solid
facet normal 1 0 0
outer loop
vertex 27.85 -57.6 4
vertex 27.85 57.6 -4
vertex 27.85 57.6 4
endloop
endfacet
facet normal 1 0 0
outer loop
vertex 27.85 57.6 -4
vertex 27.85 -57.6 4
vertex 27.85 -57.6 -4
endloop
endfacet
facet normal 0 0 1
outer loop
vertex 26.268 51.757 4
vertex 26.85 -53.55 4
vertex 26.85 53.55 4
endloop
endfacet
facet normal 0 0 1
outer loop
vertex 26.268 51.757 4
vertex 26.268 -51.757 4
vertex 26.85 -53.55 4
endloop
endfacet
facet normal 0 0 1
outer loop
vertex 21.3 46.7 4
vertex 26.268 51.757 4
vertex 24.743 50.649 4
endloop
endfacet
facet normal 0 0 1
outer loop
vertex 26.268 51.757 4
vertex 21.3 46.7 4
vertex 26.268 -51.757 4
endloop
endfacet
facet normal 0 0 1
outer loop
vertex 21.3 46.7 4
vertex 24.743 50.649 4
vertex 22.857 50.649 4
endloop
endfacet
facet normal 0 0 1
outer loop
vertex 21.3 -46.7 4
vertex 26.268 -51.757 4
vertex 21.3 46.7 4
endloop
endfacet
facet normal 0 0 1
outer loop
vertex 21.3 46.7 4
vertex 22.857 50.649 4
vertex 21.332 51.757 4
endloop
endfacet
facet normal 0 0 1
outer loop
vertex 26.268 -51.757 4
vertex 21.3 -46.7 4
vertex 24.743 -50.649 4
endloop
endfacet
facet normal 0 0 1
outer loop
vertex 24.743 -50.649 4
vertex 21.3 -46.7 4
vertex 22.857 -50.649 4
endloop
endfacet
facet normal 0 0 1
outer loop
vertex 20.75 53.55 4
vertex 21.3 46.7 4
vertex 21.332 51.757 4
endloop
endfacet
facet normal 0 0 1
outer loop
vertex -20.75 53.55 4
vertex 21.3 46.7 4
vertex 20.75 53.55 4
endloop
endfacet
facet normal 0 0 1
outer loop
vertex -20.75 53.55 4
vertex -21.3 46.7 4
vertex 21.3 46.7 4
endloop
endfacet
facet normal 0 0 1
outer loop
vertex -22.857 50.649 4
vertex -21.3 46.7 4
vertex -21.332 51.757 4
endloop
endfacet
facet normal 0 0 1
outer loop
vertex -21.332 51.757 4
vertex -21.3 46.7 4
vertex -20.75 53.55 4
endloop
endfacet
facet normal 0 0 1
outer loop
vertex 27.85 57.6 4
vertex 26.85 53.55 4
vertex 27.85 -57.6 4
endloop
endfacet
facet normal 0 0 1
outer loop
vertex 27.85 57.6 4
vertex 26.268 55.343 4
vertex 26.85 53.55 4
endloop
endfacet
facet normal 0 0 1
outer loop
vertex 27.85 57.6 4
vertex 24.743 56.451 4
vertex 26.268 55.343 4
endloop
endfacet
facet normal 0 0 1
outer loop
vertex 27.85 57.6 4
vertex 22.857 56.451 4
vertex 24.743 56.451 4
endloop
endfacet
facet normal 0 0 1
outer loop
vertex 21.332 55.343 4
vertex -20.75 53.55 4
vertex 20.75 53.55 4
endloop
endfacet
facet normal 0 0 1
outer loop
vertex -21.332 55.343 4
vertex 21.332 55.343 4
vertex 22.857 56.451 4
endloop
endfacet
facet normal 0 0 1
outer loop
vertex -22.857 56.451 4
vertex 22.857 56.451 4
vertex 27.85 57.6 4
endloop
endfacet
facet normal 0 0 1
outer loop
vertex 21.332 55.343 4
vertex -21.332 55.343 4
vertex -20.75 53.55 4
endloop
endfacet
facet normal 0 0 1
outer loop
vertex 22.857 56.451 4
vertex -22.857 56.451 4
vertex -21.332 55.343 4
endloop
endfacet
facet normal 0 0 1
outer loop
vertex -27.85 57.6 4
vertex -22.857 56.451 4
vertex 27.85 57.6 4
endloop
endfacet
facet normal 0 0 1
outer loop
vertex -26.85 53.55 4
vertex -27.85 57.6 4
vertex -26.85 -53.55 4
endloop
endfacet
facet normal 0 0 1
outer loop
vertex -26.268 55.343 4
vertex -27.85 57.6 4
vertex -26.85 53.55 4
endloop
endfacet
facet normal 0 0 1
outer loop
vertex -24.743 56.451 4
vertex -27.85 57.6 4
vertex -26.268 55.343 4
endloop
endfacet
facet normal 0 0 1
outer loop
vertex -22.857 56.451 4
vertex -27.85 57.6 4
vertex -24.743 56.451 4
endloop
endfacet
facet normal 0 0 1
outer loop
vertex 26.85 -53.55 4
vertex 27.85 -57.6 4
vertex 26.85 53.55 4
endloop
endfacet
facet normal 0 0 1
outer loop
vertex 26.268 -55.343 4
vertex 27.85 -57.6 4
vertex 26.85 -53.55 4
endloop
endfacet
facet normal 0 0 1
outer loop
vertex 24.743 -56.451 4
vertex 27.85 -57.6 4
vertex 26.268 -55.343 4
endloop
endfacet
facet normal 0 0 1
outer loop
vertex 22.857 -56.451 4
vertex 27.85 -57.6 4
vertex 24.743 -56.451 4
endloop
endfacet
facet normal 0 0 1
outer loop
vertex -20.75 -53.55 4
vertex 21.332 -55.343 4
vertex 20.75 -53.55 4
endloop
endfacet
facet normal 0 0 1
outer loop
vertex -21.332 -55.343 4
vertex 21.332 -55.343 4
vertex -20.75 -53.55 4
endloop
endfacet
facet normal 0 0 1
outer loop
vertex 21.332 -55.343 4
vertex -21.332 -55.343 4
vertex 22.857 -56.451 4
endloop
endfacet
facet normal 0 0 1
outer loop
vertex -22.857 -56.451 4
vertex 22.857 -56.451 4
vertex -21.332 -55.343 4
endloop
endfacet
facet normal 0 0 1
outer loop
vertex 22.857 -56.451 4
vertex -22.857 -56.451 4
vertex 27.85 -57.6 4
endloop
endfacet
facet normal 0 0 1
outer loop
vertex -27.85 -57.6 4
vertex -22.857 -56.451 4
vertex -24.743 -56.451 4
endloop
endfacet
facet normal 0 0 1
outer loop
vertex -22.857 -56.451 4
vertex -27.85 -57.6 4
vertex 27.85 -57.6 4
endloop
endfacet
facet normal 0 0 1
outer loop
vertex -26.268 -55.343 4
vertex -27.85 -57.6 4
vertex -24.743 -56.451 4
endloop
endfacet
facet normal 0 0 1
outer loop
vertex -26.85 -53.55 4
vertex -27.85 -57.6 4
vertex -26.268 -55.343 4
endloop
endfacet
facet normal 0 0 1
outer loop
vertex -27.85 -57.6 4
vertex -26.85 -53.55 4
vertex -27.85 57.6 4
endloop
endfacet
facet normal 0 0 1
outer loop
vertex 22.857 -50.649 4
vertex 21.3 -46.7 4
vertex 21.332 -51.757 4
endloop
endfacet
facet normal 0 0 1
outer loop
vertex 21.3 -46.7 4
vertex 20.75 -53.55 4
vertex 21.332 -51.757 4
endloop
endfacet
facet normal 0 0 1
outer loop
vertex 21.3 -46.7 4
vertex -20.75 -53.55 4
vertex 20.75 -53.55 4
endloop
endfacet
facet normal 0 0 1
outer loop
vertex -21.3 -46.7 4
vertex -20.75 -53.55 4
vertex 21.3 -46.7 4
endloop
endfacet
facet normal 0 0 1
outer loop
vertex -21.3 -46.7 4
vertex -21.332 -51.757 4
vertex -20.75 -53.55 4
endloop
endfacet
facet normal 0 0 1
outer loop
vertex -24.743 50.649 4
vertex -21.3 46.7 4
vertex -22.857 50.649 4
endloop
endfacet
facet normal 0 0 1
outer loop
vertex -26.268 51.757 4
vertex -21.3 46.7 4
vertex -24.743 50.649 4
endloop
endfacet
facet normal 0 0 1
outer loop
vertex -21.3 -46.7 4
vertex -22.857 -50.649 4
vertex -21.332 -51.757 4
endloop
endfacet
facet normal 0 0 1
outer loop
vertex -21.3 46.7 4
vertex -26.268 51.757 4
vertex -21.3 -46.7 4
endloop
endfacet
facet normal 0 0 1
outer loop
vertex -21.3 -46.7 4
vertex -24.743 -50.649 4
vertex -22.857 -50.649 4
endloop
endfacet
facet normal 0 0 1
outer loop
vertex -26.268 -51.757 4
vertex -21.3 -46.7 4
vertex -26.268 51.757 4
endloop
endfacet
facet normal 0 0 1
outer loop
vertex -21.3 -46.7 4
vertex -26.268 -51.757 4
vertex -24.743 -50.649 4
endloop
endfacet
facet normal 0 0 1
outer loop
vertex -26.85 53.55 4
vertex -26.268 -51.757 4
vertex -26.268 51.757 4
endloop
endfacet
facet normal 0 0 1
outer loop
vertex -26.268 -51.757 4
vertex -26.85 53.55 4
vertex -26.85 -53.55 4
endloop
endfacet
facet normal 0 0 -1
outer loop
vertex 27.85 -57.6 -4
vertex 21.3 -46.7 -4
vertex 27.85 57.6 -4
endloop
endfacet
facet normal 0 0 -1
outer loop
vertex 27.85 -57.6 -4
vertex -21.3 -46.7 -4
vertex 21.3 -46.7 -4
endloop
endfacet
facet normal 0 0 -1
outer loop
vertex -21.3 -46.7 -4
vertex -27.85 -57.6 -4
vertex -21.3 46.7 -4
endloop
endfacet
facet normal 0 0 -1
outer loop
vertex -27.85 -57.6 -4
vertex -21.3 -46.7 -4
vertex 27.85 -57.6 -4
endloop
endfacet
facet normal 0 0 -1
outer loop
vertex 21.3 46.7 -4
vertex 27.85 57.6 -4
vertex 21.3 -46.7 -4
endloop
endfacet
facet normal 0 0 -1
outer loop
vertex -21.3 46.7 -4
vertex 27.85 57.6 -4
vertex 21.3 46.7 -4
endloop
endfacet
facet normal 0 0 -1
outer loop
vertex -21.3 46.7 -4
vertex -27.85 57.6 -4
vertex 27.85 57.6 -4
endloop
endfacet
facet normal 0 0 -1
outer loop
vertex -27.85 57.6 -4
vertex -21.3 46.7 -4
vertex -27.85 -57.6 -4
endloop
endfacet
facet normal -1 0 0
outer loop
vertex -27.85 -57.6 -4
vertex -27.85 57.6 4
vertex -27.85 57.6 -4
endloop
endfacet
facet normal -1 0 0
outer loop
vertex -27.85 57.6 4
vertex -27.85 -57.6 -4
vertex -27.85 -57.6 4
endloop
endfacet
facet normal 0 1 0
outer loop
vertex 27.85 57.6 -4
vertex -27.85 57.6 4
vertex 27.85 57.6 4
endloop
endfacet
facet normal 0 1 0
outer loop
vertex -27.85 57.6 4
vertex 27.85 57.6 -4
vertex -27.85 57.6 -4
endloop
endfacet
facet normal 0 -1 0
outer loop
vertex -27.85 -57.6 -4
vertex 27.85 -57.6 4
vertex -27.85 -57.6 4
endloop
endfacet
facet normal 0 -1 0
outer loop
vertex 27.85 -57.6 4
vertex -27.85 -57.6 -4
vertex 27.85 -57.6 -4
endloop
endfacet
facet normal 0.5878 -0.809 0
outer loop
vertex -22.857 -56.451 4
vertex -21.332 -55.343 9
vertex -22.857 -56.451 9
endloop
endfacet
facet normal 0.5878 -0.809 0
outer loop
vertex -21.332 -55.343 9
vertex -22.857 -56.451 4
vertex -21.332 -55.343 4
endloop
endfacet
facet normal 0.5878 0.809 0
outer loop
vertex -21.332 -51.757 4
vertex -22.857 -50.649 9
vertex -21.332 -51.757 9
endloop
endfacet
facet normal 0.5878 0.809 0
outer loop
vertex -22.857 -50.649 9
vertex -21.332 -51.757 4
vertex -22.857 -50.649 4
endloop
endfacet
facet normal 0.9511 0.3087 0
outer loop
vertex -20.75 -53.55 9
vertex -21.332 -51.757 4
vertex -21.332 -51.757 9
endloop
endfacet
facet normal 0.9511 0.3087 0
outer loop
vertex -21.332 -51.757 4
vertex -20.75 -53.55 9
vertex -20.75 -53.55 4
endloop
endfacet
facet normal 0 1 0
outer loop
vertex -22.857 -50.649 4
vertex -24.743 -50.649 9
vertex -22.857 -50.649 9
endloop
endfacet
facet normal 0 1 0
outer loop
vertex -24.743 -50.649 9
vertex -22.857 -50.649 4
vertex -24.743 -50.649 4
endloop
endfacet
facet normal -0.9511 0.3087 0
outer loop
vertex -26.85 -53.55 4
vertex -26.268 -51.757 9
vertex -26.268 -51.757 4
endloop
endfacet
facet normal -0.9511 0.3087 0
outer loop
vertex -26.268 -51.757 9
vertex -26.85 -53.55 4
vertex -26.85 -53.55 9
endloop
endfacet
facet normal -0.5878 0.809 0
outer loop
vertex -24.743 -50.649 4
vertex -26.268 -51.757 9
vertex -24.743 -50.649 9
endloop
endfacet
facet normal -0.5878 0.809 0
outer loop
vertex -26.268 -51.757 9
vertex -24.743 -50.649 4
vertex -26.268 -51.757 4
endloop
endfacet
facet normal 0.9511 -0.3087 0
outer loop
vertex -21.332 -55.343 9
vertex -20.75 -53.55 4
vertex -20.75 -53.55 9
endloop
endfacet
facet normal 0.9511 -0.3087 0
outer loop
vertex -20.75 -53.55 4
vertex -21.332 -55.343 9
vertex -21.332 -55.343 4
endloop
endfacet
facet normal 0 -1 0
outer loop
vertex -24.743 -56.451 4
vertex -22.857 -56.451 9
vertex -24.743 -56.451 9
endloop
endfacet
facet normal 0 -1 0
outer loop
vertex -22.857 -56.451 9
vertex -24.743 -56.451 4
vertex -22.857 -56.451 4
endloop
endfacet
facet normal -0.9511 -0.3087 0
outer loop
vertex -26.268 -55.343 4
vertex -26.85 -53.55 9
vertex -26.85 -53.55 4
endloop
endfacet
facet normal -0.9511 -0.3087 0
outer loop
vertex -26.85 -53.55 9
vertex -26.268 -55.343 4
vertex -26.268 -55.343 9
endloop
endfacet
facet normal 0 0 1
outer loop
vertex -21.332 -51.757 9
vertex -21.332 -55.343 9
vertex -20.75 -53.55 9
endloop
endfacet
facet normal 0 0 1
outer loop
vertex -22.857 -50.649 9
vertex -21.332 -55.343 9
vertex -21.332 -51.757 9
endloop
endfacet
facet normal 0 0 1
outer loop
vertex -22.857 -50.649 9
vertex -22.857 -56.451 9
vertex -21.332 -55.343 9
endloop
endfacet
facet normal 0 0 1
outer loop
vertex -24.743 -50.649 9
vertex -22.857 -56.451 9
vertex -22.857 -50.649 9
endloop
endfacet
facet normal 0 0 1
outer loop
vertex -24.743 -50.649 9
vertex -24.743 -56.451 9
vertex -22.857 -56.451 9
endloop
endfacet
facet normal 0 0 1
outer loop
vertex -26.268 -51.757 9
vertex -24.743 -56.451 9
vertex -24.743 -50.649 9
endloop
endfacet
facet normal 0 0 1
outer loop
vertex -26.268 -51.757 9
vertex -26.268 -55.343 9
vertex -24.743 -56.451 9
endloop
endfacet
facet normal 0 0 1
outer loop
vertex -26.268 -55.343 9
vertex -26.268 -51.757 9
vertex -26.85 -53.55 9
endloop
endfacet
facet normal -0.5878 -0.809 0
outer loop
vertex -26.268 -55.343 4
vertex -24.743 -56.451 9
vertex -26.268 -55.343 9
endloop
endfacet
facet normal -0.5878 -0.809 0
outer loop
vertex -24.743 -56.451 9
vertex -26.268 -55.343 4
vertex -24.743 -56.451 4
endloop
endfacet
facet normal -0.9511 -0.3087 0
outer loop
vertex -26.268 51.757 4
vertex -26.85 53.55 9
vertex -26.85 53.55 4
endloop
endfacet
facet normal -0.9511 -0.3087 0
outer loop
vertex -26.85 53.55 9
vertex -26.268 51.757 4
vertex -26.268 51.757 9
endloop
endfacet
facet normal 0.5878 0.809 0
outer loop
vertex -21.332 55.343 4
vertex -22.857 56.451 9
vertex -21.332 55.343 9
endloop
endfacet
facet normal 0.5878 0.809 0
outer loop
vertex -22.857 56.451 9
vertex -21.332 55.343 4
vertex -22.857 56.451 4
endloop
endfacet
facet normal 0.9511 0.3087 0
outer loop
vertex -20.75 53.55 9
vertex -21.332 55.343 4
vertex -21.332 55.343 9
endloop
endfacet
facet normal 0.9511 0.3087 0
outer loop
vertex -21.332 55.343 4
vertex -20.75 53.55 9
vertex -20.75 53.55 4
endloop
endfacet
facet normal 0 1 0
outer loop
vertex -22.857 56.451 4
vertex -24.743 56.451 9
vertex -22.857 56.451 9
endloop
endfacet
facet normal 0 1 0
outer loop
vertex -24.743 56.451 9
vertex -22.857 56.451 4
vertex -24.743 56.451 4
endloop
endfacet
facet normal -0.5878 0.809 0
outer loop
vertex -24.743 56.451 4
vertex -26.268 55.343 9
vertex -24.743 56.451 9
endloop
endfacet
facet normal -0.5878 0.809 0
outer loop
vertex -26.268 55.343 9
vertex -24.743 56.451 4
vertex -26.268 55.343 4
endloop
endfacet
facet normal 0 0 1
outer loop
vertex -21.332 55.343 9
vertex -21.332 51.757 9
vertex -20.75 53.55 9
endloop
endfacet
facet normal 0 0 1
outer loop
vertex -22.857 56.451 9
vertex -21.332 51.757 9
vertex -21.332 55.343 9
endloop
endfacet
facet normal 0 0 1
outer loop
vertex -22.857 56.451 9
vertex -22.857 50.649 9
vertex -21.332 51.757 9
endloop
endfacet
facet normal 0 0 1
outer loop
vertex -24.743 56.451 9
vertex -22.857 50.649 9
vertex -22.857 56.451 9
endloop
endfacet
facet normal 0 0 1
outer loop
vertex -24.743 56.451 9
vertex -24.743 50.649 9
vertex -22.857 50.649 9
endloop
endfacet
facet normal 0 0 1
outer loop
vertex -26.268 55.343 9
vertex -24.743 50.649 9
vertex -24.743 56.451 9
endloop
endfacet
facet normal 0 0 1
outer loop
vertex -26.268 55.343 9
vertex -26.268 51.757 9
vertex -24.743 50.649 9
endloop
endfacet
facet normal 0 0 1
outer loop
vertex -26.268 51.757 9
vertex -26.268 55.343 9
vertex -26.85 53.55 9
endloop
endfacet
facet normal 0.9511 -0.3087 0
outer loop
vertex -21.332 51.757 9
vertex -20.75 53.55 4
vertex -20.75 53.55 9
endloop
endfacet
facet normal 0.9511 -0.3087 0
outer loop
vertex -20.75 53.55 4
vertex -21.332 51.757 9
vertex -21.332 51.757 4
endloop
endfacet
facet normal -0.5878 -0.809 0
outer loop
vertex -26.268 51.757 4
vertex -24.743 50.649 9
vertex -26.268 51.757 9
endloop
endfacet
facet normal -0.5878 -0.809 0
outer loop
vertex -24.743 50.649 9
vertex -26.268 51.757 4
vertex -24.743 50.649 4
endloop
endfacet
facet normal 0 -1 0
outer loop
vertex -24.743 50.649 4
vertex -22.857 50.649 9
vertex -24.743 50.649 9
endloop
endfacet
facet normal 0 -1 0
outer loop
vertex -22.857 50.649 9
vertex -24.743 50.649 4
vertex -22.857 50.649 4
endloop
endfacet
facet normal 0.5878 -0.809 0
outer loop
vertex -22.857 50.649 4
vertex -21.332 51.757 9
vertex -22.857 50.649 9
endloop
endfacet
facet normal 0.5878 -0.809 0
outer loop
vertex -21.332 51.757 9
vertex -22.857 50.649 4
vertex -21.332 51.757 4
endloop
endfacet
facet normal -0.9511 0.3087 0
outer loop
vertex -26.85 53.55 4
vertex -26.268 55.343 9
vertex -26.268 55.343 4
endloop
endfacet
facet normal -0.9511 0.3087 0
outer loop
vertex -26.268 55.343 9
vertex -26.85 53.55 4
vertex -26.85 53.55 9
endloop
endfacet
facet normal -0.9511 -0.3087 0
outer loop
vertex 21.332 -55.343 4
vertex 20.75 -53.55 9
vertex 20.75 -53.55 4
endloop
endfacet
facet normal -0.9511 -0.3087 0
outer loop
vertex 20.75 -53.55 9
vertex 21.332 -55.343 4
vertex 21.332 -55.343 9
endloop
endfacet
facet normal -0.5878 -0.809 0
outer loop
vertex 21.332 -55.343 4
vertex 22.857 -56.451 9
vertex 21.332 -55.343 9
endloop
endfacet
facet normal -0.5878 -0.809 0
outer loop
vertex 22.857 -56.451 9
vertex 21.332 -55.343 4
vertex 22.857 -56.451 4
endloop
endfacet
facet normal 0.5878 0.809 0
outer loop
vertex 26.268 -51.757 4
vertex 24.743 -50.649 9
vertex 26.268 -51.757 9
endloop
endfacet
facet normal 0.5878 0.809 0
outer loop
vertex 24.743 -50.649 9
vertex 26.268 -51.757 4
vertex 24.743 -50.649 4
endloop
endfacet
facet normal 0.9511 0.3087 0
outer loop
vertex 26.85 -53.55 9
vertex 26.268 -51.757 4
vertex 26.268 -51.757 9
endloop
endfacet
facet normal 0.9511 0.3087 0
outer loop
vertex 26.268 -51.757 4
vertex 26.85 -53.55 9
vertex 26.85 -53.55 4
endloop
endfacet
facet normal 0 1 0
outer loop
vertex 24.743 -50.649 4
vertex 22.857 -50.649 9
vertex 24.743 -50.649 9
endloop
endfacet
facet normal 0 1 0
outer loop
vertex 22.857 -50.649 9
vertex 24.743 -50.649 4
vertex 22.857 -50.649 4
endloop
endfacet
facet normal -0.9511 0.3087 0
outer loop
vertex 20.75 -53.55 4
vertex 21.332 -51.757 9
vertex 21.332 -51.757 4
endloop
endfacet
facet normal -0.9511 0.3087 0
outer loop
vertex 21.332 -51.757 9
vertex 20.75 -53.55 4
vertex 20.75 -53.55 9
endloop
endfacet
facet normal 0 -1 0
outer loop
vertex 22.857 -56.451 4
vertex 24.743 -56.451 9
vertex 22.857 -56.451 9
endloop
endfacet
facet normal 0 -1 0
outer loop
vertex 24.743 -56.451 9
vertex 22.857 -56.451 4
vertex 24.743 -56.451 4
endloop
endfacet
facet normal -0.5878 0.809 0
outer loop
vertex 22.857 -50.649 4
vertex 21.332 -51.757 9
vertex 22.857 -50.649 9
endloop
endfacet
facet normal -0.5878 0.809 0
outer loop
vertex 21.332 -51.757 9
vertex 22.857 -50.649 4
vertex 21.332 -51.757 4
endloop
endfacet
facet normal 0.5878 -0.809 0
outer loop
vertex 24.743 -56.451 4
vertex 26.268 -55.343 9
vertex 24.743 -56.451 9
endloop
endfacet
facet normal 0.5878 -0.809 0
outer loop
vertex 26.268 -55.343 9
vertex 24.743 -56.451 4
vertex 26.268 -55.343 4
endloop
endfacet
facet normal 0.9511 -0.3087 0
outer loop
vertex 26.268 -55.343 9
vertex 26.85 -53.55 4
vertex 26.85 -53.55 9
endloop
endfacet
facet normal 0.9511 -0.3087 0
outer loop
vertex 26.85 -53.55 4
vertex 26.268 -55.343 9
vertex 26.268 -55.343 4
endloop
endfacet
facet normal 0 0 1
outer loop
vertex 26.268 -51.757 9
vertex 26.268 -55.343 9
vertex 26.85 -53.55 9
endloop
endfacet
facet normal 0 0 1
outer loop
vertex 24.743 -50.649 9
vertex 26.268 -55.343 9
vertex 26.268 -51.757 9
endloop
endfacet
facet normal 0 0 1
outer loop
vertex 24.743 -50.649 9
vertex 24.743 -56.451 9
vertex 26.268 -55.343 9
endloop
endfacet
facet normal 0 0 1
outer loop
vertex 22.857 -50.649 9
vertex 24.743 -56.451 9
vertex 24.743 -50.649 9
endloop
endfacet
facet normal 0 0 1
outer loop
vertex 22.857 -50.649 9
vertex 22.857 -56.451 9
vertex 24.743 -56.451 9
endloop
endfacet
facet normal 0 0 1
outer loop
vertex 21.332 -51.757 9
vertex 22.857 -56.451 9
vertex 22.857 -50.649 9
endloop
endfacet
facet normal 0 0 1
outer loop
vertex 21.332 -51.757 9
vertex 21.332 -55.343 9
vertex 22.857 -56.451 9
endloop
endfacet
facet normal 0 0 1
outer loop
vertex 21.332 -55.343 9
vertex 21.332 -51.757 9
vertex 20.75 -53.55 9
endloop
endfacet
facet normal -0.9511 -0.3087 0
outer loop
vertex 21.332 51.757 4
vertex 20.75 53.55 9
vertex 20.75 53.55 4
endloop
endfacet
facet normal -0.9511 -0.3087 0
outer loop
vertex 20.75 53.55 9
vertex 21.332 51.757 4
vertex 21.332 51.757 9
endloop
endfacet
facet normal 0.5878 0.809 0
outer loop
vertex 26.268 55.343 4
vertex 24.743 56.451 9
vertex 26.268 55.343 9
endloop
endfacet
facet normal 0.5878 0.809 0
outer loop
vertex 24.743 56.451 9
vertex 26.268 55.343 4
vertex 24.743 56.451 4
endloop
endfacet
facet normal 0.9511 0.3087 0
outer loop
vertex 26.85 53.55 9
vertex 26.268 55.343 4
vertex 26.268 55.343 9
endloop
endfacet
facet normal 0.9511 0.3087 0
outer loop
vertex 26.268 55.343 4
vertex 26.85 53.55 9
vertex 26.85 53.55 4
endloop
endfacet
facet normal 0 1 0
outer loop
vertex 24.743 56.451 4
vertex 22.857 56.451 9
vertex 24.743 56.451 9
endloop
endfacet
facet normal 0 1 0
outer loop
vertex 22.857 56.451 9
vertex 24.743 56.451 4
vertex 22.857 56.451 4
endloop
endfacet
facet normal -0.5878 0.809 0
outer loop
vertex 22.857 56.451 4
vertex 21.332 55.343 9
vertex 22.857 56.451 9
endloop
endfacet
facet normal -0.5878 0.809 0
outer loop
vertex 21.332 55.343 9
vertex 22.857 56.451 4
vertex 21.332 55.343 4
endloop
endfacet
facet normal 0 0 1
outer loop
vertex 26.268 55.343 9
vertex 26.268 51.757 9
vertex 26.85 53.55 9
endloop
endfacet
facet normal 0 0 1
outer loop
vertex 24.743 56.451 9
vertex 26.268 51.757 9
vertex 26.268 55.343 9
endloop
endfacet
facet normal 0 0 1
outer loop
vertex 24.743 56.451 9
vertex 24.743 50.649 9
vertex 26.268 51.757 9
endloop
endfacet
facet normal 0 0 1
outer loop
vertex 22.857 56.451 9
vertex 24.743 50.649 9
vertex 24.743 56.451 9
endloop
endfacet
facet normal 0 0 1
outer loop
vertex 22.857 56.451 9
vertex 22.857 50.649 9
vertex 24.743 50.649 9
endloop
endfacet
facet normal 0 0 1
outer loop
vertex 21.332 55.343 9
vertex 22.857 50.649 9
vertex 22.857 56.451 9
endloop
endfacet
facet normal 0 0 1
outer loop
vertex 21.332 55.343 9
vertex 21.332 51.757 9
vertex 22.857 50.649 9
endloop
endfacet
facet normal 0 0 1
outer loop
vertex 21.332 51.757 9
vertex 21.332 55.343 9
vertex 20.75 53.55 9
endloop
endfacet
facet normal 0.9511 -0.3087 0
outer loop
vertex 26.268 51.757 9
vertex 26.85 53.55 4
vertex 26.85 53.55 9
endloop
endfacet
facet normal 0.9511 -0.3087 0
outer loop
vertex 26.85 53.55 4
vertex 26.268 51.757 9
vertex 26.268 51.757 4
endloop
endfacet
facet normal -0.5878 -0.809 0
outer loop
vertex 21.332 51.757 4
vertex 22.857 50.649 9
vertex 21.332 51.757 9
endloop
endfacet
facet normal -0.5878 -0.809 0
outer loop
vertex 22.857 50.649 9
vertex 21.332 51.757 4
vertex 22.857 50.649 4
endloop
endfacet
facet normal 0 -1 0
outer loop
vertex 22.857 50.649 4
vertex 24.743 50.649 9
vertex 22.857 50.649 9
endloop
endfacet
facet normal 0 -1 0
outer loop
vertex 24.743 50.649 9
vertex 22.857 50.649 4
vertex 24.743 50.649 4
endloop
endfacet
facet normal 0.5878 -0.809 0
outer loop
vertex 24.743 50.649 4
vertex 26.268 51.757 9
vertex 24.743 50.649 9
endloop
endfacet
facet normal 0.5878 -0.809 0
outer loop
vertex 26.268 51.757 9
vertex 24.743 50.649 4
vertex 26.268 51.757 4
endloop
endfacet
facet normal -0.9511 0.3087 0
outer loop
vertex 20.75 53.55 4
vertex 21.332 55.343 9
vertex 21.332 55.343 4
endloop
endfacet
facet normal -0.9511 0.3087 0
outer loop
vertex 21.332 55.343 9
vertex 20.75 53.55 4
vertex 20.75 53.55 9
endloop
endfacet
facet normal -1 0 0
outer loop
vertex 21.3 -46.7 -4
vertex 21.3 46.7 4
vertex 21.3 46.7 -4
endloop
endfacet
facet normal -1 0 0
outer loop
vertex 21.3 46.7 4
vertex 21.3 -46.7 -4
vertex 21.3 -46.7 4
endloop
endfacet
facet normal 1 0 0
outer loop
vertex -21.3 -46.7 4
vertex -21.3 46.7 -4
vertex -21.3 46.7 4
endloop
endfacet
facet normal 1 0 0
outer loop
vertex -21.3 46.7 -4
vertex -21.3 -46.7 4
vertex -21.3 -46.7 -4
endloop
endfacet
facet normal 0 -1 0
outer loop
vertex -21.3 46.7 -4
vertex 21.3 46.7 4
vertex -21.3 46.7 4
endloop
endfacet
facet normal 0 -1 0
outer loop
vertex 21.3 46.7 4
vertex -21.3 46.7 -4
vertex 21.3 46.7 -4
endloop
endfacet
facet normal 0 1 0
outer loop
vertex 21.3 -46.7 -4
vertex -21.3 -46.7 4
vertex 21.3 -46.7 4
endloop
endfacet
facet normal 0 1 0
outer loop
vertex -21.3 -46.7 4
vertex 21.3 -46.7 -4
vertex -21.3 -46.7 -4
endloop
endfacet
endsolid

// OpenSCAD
/**
 * MIT License
 *
 * Copyright (c) 2026 Adam Kuczyński
 *
 * Permission is hereby granted, free of charge, to any person obtaining a copy
 * of this software and associated documentation files (the "Software"), to deal
 * in the Software without restriction, including without limitation the rights
 * to use, copy, modify, merge, publish, distribute, sublicense, and/or sell
 * copies of the Software, and to permit persons to whom the Software is
 * furnished to do so, subject to the following conditions:
 *
 * The above copyright notice and this permission notice shall be included in all
 * copies or substantial portions of the Software.
 *
 * THE SOFTWARE IS PROVIDED "AS IS", WITHOUT WARRANTY OF ANY KIND, EXPRESS OR
 * IMPLIED, INCLUDING BUT NOT LIMITED TO THE WARRANTIES OF MERCHANTABILITY,
 * FITNESS FOR A PARTICULAR PURPOSE AND NONINFRINGEMENT. IN NO EVENT SHALL THE
 * AUTHORS OR COPYRIGHT HOLDERS BE LIABLE FOR ANY CLAIM, DAMAGES OR OTHER
 * LIABILITY, WHETHER IN AN ACTION OF CONTRACT, TORT OR OTHERWISE, ARISING FROM,
 * OUT OF OR IN CONNECTION WITH THE SOFTWARE OR THE USE OR OTHER DEALINGS IN THE
 * SOFTWARE.
 */

difference() {
  // Set these
  length = 5 - 1;
  width = 10 - 1;
  inner_length = 42.60;
  inner_width = 93.40;
  
  // Don't touch these
  diameter = 6.10;
  distance = 11.90;
  margin = 2;

  x = distance * length / 2;
  y = distance * width / 2;

  
  outer_length = distance * length + diameter + margin;
  outer_width = distance * width + diameter + margin;

  union($fn = 100) {
    cube([outer_length, outer_width, 8.00], center = true);
    
    translate([-x, -y, 4.00])
      cylinder(h = 10, d = 6.10, center = true);
    translate([-x, y, 4.00])
      cylinder(h = 10, d = 6.10, center = true);
    translate([x, -y, 4.00])
      cylinder(h = 10, d = 6.10, center = true);
    translate([x, y, 4.00])
      cylinder(h = 10, d = 6.10, center = true);
  }

  cube([inner_length, inner_width, 8.00], center = true);
}
